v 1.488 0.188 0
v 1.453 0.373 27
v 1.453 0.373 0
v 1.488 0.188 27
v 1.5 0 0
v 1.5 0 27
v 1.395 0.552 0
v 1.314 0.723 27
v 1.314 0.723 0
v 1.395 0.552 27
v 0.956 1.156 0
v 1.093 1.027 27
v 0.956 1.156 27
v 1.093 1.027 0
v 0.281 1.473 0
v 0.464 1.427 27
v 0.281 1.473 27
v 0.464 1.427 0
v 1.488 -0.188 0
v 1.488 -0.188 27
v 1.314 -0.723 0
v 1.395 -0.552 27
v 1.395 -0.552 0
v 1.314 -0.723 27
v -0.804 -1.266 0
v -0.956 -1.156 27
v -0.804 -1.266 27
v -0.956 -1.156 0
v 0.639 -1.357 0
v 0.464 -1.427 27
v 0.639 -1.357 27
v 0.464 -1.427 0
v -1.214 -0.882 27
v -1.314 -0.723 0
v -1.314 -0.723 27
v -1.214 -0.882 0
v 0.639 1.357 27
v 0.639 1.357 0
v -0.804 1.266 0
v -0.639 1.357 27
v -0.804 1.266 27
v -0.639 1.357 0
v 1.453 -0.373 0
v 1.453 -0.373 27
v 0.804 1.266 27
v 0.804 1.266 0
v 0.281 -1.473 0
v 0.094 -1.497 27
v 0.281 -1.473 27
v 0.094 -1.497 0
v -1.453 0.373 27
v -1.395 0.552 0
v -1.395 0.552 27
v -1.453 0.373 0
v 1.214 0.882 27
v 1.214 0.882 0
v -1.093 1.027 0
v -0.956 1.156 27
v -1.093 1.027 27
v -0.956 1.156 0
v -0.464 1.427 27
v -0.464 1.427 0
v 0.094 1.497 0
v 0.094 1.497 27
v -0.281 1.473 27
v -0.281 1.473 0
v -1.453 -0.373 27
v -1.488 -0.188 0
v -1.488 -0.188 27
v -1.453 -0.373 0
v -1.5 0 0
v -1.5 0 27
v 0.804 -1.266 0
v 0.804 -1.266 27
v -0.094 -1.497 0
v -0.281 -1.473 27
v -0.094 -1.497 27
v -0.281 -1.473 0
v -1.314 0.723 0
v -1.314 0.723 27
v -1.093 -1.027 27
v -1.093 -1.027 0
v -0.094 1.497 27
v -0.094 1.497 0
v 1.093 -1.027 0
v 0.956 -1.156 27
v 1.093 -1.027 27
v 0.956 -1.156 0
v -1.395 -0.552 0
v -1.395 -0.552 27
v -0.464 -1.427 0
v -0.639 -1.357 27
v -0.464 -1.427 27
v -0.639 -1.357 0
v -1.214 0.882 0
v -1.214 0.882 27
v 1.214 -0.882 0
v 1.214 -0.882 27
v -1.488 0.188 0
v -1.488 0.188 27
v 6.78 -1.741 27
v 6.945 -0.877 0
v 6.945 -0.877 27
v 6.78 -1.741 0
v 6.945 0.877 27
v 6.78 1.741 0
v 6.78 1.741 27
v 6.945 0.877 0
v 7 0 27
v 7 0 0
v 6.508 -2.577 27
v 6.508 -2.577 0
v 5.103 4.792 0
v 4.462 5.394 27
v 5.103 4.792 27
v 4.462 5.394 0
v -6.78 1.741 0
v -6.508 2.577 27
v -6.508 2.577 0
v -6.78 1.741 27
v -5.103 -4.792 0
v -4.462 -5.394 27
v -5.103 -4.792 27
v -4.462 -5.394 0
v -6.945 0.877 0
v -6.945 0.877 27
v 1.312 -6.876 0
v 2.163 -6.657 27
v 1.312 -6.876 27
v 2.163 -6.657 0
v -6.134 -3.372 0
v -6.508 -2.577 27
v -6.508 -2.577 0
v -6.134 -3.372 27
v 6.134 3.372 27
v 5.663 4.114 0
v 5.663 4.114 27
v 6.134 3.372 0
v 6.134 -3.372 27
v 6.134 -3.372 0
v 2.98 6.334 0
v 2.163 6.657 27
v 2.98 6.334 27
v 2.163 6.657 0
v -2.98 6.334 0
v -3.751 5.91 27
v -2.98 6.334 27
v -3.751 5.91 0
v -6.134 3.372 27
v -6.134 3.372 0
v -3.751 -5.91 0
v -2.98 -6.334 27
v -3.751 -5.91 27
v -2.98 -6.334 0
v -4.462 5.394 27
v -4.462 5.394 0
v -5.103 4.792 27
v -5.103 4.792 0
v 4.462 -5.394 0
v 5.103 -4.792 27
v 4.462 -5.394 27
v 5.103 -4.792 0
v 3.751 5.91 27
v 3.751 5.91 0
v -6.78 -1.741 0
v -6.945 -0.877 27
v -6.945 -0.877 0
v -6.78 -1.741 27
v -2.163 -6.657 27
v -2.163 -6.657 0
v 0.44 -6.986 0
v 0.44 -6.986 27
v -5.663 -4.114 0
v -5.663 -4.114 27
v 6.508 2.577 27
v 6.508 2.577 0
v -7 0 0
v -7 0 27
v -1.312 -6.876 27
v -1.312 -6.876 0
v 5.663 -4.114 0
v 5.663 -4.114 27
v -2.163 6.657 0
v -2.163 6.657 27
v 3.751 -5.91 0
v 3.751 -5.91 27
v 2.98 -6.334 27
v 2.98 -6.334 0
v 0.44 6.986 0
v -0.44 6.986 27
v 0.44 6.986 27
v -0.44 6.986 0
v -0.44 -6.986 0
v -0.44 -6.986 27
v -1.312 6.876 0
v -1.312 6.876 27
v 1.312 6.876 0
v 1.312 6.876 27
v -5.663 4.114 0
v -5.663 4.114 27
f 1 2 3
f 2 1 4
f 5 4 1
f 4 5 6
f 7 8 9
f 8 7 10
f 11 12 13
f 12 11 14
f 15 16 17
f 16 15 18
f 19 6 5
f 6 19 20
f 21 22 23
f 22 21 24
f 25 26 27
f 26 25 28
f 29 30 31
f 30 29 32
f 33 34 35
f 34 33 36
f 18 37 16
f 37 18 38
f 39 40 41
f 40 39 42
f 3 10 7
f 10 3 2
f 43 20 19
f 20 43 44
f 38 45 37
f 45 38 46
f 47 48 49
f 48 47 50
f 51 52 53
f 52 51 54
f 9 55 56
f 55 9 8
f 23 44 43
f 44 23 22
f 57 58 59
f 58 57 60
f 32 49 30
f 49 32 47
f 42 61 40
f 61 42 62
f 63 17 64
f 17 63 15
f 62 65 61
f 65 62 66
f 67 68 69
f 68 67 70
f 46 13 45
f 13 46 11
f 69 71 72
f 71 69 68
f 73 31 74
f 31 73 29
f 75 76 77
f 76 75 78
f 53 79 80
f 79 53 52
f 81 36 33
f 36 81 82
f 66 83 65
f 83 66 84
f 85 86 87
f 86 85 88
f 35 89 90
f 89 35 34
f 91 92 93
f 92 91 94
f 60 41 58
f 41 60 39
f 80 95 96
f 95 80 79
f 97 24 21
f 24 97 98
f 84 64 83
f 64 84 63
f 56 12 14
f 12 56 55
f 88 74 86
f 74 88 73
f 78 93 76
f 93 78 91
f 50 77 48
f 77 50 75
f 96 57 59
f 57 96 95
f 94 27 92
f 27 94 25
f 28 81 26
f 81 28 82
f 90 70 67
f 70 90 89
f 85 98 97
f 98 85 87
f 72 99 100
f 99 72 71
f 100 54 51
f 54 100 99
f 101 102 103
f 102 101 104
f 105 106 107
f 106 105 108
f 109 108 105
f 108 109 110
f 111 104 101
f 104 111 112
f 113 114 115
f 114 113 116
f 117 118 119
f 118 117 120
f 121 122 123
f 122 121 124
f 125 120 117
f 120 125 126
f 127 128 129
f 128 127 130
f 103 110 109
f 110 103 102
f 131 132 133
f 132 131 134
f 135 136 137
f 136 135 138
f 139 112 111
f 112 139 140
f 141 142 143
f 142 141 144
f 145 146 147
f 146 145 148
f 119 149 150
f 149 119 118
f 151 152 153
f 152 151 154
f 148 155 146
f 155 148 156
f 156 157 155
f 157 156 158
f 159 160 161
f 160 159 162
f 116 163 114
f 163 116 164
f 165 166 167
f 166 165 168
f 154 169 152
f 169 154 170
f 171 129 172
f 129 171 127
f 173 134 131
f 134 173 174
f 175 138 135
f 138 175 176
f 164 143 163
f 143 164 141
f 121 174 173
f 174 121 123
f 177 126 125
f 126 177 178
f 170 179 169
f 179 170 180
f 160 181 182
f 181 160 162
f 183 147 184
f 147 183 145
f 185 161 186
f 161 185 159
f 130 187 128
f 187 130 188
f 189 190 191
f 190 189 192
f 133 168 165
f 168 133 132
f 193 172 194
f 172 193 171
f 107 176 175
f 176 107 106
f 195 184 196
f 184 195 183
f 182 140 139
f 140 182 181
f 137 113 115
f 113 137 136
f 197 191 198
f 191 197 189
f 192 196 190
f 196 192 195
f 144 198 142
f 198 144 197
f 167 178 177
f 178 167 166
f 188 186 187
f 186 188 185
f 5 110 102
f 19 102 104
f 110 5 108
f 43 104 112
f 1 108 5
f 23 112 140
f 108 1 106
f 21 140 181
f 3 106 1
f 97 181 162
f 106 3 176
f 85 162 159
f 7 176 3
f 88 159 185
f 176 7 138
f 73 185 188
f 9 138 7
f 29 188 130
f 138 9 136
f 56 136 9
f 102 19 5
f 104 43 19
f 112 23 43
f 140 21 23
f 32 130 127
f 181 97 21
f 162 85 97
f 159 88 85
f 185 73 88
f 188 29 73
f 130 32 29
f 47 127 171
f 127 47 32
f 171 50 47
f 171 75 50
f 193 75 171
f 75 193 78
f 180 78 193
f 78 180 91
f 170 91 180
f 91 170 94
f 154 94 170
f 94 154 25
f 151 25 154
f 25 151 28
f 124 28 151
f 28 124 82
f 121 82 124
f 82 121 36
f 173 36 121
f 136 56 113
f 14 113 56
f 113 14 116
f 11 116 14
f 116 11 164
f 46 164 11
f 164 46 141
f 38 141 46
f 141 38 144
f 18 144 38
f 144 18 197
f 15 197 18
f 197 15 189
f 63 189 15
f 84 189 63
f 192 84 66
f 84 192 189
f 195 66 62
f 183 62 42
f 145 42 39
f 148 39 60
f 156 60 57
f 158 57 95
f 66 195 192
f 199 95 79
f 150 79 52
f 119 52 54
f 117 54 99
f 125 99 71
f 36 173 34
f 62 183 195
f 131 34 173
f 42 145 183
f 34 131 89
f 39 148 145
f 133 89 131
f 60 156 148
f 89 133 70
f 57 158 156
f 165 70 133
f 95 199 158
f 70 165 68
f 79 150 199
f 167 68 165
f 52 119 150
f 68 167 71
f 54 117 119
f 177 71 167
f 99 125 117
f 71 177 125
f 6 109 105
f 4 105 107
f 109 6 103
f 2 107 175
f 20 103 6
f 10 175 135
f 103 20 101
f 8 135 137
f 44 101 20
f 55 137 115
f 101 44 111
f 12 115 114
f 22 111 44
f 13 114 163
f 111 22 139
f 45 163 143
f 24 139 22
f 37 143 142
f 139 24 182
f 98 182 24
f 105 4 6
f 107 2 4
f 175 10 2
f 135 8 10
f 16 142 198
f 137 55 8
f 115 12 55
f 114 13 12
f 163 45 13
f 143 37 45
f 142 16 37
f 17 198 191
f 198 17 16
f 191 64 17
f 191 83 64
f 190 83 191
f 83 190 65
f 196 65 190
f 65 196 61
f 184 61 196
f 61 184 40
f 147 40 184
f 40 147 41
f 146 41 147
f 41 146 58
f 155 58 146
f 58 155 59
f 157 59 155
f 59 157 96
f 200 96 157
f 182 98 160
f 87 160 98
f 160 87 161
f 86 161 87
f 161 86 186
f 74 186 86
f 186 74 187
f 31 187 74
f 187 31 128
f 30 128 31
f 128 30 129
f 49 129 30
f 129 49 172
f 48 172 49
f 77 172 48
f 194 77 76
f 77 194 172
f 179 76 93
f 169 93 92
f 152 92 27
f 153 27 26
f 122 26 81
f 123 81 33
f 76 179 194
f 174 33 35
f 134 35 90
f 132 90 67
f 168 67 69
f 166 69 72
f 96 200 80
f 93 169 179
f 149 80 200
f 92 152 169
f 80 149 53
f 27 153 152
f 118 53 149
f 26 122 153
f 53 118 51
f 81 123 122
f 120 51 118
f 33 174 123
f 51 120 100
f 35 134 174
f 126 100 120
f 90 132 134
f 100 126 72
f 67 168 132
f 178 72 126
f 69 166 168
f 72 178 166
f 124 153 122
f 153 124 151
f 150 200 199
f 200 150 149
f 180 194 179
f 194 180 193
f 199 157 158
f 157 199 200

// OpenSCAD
$fn = 50;


difference() {
	union() {
		cylinder(h = 27, r = 7.0000000000);
	}
	union() {
		translate(v = [0, 0, -100]) {
			cylinder(h = 200, r = 1.5000000000);
		}
		translate(v = [0, 0, -100]) {
			cylinder(h = 200, r = 1.5000000000);
		}
	}
}
